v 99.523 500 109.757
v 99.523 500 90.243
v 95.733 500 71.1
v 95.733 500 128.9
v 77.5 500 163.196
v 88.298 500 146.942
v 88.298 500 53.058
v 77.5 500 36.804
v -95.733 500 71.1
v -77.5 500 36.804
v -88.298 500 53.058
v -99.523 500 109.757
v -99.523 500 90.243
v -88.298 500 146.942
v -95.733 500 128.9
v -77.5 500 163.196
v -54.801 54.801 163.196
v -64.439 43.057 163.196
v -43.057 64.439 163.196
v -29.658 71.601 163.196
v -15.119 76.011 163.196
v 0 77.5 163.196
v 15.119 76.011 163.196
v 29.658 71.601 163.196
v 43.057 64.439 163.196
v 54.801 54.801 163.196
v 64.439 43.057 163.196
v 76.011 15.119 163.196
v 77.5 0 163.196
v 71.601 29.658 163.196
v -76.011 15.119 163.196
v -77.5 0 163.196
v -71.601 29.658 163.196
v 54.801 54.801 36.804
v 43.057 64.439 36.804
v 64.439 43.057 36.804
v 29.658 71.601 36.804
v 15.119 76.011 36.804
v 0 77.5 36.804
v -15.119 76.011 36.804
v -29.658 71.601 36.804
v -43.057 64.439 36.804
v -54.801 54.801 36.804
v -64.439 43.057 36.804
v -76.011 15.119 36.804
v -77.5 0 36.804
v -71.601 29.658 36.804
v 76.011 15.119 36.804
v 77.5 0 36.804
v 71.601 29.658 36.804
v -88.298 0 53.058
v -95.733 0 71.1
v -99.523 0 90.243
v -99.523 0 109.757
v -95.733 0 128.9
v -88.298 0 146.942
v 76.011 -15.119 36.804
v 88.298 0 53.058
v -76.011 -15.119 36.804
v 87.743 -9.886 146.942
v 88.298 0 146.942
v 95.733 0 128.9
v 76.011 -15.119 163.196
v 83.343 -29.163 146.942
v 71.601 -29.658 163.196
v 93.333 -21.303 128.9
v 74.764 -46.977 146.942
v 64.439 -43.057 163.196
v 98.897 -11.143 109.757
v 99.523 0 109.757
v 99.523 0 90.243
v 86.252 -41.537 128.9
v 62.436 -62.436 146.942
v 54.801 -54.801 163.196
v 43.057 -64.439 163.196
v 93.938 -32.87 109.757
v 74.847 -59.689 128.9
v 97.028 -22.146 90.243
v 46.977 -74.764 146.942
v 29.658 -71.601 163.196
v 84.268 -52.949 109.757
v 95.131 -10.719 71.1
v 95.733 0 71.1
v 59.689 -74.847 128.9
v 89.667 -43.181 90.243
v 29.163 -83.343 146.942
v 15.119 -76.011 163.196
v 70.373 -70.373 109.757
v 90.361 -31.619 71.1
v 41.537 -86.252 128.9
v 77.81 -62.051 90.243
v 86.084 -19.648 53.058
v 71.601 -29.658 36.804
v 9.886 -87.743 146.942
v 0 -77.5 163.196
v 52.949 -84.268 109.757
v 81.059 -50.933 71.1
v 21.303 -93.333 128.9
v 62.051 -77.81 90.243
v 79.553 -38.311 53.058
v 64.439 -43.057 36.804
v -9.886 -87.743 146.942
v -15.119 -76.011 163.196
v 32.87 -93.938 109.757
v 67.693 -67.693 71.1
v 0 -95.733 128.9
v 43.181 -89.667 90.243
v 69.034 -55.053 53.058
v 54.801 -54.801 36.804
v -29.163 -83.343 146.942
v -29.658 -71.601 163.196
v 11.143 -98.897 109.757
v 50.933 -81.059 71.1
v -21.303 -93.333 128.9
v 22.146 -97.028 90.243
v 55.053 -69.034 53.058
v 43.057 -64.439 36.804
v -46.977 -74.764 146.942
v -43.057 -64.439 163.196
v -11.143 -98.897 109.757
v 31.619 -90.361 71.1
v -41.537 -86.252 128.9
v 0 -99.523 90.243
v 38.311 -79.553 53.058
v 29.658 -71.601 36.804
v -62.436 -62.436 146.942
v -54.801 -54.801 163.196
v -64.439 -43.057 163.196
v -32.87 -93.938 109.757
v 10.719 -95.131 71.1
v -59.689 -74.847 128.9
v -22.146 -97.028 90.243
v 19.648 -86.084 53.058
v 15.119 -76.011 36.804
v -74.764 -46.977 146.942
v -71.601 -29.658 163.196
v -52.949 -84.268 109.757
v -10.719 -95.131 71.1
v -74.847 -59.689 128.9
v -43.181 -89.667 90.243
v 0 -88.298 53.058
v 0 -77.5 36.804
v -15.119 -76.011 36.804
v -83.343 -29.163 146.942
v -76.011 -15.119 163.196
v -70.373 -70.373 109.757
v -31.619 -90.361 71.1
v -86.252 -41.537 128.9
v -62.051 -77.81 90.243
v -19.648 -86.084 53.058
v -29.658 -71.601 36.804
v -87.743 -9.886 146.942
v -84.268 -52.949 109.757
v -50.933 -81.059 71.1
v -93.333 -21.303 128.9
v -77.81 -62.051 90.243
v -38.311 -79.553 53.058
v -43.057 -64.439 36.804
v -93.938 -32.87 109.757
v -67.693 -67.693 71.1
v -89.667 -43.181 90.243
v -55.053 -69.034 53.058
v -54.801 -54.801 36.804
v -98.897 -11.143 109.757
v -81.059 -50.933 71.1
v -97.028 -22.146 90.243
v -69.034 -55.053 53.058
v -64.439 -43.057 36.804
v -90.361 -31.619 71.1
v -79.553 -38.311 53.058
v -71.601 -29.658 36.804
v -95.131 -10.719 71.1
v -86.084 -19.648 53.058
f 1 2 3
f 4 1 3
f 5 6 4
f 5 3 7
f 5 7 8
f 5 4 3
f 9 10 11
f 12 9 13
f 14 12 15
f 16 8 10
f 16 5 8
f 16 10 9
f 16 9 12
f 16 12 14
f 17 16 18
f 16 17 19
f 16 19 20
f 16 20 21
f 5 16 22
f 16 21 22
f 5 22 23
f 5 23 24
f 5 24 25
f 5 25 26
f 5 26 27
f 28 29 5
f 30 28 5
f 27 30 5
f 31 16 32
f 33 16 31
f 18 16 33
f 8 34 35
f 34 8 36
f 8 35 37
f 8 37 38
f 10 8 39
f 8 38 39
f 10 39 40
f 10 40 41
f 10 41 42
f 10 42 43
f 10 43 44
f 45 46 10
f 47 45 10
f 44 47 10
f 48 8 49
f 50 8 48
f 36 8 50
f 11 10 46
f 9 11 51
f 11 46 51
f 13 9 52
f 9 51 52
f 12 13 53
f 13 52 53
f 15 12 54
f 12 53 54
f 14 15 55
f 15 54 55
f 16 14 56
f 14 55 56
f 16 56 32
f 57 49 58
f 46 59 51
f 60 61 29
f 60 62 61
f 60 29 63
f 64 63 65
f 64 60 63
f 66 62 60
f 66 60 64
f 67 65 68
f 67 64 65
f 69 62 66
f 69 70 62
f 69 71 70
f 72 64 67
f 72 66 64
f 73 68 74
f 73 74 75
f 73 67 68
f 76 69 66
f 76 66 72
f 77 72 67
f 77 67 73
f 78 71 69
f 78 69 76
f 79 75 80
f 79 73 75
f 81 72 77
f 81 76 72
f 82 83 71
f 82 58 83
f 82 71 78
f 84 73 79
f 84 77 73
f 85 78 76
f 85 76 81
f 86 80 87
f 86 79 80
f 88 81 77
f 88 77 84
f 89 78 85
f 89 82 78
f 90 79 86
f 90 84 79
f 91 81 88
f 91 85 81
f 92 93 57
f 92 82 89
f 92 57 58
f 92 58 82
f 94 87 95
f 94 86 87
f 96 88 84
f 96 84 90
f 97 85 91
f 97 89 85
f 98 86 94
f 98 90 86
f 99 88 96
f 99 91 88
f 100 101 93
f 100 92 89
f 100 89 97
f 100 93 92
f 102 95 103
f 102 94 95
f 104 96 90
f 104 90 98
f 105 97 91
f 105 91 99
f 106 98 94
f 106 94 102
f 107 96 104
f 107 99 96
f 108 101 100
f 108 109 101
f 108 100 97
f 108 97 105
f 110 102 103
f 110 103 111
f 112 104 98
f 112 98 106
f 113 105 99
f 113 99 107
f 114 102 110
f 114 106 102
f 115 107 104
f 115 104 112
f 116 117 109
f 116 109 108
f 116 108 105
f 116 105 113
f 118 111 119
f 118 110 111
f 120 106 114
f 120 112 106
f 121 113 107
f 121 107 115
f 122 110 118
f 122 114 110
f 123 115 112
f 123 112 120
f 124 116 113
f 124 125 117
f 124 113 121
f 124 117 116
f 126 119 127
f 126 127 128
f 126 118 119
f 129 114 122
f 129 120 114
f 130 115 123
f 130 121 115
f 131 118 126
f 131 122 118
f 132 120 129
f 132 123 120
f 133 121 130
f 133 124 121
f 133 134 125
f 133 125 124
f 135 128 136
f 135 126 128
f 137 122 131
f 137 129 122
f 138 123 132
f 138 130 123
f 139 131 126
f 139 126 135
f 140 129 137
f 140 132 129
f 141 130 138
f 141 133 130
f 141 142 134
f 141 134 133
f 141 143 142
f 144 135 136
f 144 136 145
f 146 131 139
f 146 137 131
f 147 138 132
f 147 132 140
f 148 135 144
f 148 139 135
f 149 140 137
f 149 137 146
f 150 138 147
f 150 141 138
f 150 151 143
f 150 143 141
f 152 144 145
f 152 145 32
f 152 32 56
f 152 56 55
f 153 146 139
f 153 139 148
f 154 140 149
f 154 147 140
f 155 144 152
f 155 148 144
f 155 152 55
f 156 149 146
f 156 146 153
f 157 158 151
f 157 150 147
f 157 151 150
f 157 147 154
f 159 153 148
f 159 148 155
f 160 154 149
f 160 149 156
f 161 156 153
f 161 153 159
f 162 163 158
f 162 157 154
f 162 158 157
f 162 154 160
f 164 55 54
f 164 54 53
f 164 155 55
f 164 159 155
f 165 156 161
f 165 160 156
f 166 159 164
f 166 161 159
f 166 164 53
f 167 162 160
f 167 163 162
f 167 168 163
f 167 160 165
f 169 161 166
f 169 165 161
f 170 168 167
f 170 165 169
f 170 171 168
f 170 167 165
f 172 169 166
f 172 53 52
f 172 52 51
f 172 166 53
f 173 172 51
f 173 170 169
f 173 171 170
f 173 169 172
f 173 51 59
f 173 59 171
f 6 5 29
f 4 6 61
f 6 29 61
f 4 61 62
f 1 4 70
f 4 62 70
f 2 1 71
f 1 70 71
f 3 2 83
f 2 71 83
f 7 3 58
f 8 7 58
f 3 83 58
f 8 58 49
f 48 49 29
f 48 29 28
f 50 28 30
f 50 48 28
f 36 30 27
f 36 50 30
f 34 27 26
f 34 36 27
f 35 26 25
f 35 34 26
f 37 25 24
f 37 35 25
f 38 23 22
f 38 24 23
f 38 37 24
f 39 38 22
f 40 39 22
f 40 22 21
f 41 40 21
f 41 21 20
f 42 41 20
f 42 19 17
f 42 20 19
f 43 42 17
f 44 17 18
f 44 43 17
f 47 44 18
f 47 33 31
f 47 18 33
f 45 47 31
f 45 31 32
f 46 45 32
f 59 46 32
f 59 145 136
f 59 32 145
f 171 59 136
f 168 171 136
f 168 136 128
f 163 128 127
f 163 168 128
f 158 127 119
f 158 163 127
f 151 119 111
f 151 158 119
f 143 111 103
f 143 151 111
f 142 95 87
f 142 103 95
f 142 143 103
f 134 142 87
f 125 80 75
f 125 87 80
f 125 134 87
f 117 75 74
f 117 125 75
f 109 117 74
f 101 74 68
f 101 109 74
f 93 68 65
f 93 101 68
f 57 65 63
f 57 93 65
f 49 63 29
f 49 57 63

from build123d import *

# Parameters (mm, degrees)
F3_R     = 77.5
F4_DEPTH = 225.001
F7_DEPTH = 500
F8_R     = 77.5
F9_DEPTH = 163.1971232988


with BuildPart() as f1:
    # F0 (on Front) → F1 (revolve)
    with BuildSketch(Plane.XZ):
        with BuildLine():
            Line((0, 0), (0, 200))
            ThreePointArc((0, 200), (-100, 100), (0, 0))
        make_face()
    revolve(axis=Axis((0, 0, 100), (0, 0, -1)))

    # F3 (on offset) → F4 (cut, through all)
    with BuildSketch(Plane.XY.offset(-25)):
        Circle(F3_R)
    extrude(amount=F4_DEPTH, mode=Mode.SUBTRACT)

    # F6 (on face) → F7 (join)
    with BuildSketch(Plane(origin=(0, 0, 0), x_dir=(-1, 0, 0), z_dir=(0, 1, 0))):
        with BuildLine():
            ThreePointArc((77.5, 36.8038767012), (100, 100), (77.5, 163.1961232988))
            Line((77.5, 163.1961232988), (0, 163.1961232988))
            Line((0, 163.1961232988), (0, 36.8038767012))
            Line((0, 36.8038767012), (77.5, 36.8038767012))
        make_face()
        with BuildLine():
            Line((0, 36.8038767012), (0, 163.1961232988))
            Line((0, 163.1961232988), (-77.5, 163.1961232988))
            ThreePointArc((-77.5, 163.1961232988), (-100, 100), (-77.5, 36.8038767012))
            Line((-77.5, 36.8038767012), (0, 36.8038767012))
        make_face()
    extrude(amount=F7_DEPTH)

    # F8 (on Top) → F9 (cut, through all)
    with BuildSketch(Plane.XY):
        Circle(F8_R)
    extrude(amount=F9_DEPTH, mode=Mode.SUBTRACT)


solid = f1.part
